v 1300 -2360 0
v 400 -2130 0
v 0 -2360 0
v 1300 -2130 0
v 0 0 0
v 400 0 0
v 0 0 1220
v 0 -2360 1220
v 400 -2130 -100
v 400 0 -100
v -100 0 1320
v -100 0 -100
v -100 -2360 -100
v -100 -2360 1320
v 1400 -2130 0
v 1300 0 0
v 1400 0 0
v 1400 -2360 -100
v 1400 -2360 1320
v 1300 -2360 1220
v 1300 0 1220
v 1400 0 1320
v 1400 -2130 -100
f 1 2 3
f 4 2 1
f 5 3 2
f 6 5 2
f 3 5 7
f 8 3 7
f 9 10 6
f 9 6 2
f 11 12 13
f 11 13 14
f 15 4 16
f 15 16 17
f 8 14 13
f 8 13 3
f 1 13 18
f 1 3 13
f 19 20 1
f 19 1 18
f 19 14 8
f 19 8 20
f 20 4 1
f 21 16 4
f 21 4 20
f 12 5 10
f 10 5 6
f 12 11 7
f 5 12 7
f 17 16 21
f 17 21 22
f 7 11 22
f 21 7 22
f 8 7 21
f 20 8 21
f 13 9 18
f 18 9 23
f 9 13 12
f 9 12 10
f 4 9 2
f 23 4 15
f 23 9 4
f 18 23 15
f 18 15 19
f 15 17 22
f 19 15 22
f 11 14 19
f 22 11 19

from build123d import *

# Parameters (mm, degrees)
F1_W     = 1500
F1_H     = 1420
F1_W_2   = 1300
F1_H_2   = 1220
F2_DEPTH = 2360
F3_W     = 1000
F3_H     = 2130
F0_DEPTH = 100


with BuildPart() as f2:
    # F1 (on Front) → F2 (new body)
    with BuildSketch(Plane.XZ):
        with Locations((650, 610)):
            Rectangle(F1_W, F1_H)
        with Locations((650, 610)):
            Rectangle(F1_W_2, F1_H_2, mode=Mode.SUBTRACT)
    extrude(amount=F2_DEPTH)

    # F3 (on face) → F0 (cut)
    with BuildSketch(Plane(origin=(0, 0, -100), x_dir=(1, 0, 0), z_dir=(0, 0, -1))):
        with Locations((900, 1065)):
            Rectangle(F3_W, F3_H)
    extrude(amount=-F0_DEPTH, mode=Mode.SUBTRACT)


solid = f2.part
